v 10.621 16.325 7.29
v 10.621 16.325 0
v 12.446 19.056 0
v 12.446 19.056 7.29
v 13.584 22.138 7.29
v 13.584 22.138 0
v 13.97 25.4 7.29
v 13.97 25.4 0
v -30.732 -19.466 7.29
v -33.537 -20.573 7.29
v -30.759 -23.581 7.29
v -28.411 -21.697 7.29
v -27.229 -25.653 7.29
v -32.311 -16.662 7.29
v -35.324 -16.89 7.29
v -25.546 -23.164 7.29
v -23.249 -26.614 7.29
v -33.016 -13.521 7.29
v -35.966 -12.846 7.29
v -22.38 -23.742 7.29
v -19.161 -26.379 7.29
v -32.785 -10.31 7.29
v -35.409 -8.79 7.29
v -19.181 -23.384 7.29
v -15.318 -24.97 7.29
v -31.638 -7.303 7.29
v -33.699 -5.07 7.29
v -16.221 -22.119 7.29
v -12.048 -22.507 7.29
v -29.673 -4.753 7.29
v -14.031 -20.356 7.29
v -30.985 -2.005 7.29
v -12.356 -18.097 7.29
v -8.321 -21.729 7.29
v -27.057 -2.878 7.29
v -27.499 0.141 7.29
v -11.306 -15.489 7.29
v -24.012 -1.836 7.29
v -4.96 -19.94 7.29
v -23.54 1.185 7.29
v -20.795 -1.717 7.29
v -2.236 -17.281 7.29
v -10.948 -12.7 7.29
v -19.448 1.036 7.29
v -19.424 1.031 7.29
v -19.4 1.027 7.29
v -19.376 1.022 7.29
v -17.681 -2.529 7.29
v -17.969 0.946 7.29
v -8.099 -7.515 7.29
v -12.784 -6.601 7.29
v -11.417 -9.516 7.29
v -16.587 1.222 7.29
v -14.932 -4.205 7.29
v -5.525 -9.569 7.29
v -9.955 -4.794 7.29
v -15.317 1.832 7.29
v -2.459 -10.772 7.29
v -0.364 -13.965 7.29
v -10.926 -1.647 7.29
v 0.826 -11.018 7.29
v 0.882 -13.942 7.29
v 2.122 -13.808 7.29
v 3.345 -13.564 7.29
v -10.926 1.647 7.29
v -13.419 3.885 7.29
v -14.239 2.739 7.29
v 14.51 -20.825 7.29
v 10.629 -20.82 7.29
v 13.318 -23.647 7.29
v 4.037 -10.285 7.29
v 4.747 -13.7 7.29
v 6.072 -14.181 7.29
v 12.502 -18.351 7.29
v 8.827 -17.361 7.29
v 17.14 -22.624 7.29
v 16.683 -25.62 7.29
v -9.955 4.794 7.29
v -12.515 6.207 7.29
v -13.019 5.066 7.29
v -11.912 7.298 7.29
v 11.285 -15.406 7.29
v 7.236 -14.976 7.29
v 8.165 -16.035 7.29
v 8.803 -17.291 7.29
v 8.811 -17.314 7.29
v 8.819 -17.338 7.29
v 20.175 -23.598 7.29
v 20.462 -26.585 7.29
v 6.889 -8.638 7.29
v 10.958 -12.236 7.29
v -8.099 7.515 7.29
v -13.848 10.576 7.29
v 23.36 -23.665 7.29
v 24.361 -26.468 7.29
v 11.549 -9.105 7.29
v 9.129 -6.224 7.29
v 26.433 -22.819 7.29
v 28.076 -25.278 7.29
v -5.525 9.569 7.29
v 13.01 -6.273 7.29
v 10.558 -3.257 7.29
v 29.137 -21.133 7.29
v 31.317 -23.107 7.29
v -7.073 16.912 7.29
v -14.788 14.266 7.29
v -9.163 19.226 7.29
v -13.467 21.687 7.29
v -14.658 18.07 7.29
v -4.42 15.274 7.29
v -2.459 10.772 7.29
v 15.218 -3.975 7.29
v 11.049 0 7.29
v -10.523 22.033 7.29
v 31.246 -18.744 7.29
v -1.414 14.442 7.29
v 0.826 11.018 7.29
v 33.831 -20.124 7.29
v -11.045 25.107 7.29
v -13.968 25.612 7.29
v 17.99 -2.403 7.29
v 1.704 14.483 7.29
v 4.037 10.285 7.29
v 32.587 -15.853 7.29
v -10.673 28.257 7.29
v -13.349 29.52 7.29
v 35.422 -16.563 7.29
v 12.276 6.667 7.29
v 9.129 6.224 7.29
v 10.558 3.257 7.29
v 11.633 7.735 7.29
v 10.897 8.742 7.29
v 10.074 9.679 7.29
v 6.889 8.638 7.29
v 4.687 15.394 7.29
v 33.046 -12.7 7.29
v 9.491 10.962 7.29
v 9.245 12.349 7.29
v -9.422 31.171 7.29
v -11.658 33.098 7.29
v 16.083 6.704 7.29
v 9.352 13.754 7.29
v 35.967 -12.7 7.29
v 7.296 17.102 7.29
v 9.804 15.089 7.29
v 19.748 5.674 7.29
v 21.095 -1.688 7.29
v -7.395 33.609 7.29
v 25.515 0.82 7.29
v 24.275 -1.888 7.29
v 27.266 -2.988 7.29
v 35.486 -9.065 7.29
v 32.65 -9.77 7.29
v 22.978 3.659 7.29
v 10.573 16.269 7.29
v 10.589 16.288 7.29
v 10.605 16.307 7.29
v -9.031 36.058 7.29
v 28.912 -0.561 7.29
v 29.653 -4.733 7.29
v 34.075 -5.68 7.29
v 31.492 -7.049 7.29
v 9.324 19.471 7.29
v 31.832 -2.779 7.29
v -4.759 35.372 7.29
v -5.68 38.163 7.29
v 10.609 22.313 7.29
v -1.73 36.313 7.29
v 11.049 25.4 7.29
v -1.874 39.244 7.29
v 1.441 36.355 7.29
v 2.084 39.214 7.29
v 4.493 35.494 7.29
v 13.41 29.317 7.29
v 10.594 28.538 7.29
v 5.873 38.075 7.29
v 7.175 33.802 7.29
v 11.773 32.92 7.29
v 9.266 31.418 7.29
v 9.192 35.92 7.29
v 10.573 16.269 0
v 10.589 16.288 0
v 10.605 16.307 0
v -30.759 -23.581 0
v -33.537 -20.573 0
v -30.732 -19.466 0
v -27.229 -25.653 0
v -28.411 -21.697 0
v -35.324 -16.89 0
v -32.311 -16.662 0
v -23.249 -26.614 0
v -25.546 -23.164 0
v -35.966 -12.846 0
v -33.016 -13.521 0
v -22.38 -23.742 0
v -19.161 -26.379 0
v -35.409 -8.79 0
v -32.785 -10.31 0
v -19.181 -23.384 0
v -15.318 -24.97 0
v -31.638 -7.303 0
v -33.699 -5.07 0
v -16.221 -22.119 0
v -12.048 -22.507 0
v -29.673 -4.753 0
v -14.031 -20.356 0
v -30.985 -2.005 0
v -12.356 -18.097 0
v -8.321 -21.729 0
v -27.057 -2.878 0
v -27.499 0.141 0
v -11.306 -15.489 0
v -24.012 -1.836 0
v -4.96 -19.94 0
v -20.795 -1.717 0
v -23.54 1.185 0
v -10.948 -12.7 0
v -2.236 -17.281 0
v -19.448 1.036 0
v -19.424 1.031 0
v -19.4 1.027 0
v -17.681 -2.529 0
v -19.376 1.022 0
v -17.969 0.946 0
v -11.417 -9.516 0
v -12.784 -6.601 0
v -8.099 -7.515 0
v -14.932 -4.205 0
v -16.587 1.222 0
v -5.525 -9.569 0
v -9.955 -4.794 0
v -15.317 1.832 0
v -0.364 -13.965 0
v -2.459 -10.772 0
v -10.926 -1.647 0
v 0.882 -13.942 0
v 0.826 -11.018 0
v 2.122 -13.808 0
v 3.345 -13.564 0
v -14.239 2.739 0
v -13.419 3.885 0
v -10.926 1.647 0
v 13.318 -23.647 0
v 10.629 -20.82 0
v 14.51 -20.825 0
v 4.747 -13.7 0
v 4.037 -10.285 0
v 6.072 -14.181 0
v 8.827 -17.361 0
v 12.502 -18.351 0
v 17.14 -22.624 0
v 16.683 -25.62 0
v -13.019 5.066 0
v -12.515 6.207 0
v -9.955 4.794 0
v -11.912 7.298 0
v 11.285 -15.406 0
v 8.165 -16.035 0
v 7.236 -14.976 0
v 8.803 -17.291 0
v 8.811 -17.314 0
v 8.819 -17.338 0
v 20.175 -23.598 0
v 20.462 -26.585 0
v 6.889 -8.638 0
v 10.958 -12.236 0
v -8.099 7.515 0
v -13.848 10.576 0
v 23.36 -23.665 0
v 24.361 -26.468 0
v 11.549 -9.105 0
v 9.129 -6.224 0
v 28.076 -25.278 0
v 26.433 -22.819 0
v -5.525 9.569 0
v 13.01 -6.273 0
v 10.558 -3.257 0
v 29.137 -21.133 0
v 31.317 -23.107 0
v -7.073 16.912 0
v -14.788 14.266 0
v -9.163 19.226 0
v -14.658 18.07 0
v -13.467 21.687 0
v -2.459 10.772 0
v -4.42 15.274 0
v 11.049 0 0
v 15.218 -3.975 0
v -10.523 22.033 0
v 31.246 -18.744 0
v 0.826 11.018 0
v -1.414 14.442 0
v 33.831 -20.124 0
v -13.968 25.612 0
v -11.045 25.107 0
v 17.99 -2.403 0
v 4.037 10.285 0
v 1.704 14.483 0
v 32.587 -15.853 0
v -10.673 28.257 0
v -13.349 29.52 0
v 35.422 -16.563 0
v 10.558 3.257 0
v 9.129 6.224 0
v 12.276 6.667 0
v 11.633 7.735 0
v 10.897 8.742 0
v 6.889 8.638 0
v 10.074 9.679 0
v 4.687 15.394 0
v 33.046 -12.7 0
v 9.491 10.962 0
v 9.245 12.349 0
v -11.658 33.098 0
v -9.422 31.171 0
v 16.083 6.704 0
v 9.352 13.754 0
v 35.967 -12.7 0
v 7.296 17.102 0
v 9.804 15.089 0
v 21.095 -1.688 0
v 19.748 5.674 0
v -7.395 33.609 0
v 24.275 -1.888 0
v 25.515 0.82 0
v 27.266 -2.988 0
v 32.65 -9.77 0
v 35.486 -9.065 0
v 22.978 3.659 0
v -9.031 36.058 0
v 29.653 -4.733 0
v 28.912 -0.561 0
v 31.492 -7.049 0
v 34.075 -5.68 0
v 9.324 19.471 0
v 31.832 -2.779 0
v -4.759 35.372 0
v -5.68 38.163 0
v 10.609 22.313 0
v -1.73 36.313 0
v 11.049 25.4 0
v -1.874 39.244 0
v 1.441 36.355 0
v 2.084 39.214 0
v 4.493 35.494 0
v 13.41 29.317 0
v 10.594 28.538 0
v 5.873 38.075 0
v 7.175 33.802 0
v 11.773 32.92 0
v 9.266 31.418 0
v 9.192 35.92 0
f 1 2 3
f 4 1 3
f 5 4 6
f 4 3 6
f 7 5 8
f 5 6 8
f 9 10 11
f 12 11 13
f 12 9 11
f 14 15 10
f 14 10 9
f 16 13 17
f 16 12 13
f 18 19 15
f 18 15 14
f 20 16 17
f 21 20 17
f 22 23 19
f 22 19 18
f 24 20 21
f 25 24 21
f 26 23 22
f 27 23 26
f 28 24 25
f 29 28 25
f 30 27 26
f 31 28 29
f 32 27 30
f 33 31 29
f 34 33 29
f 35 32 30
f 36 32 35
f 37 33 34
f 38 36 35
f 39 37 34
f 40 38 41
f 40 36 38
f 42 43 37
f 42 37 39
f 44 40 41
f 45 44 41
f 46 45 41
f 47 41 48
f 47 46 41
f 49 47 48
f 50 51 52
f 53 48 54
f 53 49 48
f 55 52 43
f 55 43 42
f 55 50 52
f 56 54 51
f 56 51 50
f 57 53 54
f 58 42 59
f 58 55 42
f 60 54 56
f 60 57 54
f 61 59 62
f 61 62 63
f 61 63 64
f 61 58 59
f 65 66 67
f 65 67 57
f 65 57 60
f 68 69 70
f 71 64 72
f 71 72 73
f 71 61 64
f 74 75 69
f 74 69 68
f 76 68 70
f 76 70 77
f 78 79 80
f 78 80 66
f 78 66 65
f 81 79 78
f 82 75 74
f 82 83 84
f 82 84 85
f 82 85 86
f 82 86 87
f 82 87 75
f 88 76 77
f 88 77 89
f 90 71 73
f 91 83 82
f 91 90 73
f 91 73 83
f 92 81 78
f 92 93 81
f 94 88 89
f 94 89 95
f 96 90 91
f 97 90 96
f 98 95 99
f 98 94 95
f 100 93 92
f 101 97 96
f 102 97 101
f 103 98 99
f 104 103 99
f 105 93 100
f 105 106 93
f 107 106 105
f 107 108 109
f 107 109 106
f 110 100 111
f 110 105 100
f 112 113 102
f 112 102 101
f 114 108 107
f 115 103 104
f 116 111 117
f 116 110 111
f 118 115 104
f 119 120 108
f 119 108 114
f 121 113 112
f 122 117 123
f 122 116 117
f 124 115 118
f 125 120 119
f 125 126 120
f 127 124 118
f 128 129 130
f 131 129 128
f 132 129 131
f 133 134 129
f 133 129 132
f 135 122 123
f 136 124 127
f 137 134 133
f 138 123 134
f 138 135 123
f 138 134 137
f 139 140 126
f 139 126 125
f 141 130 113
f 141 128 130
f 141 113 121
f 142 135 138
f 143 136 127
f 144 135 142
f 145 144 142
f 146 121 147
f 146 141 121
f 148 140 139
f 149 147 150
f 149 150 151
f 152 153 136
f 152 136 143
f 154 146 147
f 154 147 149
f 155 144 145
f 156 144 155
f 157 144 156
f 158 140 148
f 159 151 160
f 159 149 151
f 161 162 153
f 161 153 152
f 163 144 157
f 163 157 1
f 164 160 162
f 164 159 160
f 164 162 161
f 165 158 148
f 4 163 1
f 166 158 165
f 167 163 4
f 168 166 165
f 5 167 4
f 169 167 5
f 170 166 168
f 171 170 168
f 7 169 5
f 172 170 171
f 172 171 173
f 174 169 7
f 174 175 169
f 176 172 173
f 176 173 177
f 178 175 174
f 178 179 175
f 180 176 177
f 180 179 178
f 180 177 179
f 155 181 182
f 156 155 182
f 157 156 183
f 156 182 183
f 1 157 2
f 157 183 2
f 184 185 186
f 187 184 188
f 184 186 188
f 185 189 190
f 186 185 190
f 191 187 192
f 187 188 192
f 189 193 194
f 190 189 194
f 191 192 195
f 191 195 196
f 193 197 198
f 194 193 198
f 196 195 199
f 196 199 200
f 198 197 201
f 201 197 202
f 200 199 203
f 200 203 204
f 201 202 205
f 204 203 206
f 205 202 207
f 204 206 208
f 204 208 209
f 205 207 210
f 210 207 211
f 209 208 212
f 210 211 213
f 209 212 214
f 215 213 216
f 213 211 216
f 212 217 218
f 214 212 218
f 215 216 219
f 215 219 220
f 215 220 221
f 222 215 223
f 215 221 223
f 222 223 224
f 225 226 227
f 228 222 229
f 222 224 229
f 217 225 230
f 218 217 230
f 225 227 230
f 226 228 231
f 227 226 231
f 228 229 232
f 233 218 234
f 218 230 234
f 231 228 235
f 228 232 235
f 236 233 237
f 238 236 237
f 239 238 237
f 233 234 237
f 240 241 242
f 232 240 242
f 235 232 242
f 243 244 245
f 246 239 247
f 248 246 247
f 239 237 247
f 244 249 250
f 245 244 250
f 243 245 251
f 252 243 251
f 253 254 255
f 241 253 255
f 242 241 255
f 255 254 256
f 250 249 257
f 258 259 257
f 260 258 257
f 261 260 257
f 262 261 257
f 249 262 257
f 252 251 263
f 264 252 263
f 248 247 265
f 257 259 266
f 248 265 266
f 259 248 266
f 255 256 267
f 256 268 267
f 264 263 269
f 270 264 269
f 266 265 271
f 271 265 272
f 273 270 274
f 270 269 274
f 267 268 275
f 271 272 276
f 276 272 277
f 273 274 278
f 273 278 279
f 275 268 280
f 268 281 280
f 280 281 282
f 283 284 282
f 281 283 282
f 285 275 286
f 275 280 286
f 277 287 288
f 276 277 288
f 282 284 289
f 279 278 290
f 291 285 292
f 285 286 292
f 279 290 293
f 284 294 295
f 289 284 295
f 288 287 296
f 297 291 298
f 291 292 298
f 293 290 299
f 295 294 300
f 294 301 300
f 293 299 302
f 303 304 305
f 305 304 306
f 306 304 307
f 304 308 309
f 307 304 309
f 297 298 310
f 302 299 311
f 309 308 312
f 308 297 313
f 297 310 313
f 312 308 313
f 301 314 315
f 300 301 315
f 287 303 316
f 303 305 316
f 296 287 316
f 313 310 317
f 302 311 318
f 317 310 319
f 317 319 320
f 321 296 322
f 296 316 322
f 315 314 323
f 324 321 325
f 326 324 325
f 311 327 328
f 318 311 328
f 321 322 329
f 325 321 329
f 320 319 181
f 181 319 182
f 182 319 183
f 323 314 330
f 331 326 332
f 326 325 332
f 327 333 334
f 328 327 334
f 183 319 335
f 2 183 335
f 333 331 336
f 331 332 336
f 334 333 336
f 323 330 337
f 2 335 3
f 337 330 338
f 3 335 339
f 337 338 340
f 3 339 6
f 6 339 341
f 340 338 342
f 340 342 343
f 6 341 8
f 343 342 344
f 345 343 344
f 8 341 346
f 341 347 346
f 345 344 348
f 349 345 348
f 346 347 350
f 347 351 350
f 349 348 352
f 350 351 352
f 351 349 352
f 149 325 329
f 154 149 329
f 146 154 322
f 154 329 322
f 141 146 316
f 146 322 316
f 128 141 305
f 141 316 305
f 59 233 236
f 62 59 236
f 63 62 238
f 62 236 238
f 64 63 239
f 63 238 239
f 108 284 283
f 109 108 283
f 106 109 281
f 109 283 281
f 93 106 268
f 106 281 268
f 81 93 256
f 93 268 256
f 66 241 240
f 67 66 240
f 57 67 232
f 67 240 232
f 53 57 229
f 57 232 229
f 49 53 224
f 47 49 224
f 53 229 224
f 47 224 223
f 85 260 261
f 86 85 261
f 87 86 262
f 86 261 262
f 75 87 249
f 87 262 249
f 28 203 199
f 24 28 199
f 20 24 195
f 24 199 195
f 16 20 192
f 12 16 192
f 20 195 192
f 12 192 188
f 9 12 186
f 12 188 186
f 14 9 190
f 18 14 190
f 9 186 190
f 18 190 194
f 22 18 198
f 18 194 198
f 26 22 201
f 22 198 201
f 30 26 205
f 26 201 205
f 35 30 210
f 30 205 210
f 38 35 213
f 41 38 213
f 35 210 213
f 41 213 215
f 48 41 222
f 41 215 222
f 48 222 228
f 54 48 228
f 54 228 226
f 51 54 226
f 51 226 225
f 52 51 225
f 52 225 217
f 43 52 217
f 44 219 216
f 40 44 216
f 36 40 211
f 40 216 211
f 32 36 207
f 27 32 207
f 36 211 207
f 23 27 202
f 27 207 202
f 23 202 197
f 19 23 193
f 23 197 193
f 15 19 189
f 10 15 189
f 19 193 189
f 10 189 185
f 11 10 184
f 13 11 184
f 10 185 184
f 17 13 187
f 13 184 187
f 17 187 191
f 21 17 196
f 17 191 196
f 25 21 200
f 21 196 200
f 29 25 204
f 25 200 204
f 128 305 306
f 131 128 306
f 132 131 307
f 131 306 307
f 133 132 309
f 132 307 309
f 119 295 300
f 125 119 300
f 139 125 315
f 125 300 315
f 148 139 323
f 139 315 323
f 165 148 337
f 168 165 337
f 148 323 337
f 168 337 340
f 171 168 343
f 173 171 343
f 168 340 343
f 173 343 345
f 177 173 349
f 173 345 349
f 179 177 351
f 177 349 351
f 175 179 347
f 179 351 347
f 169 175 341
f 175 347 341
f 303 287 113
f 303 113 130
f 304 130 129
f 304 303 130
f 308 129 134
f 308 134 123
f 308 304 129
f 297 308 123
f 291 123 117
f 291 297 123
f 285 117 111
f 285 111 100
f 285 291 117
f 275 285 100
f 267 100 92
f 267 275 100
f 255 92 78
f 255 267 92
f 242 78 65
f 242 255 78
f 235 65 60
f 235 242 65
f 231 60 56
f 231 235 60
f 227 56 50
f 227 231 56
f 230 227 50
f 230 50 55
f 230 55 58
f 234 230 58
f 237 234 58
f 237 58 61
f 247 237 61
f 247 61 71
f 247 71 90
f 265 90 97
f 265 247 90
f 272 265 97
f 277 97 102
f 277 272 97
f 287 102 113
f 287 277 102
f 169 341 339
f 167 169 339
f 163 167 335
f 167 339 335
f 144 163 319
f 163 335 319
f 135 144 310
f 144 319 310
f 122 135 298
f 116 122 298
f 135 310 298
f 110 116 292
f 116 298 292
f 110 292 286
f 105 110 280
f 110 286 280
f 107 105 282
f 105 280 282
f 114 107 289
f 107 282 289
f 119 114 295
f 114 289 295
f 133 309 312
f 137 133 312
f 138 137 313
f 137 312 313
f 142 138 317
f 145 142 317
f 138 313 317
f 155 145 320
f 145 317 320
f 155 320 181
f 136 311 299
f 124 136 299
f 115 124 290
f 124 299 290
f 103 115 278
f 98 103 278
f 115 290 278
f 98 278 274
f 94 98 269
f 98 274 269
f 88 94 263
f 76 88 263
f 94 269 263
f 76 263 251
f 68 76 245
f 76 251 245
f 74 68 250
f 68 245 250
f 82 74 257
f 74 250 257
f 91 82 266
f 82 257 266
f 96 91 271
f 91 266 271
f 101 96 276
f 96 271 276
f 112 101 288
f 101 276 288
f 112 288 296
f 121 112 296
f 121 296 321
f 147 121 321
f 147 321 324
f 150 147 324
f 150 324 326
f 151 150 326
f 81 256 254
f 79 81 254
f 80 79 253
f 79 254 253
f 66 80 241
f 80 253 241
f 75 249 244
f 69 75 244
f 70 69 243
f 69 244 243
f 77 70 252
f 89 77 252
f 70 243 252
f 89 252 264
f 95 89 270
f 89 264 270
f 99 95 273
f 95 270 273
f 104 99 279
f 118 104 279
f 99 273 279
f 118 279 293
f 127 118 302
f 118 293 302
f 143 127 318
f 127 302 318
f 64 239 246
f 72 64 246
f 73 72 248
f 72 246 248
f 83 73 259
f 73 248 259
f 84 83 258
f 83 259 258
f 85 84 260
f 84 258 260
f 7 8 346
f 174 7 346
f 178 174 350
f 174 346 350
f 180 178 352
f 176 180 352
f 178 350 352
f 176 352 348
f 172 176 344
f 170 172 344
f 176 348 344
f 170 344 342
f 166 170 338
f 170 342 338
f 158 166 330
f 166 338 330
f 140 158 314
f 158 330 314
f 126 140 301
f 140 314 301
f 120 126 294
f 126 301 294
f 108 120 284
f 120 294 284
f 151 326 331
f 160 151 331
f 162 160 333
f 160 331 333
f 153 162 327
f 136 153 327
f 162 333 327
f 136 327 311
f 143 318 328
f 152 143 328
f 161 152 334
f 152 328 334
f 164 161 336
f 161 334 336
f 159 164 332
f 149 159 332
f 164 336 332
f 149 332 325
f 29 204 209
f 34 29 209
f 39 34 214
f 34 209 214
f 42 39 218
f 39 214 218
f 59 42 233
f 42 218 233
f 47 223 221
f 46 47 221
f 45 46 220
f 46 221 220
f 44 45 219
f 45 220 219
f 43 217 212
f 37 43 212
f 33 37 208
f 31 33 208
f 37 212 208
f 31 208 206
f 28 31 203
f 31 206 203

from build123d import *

# Parameters (mm, degrees)
F0_R     = 11.049
F1_DEPTH = 7.2898


# Not quite as in the source:
# - a feature names something its author has since deleted; it is built from what else it names


with BuildPart() as f1:
    # F0 (on Top) → F1 (new body)
    with BuildSketch(Plane.XY):
        with BuildLine():
            ThreePointArc((13.9084581944, -1.3098437524), (13.9546060671, -0.655644349), (13.97, 0))
            ThreePointArc((13.97, 0), (13.5399902372, 3.4394133768), (12.2764331601, 6.6670899848))
            ThreePointArc((12.2764331601, 6.6670899848), (11.2762217496, 8.2466795168), (10.0740419848, 9.6785628111))
            ThreePointArc((10.0740419848, 9.6785628111), (8.0892761862, 11.3896668425), (5.8198711326, 12.7))
            ThreePointArc((5.8198711326, 12.7), (0, 11.43), (-5.8198711326, 12.7))
            ThreePointArc((-5.8198711326, 12.7), (-9.2682549118, 10.4527676187), (-11.9120858762, 7.2981579921))
            ThreePointArc((-11.9120858762, 7.2981579921), (-12.7799448333, 5.6421547355), (-13.4189022589, 3.8850948721))
            ThreePointArc((-13.4189022589, 3.8850948721), (-13.9083789193, 1.3106852543), (-13.9084581944, -1.3098437524))
            ThreePointArc((-13.9084581944, -1.3098437524), (-9.8986703653, -5.715), (-8.0885870618, -11.3901562476))
            ThreePointArc((-8.0885870618, -11.3901562476), (-4.4182348417, -13.2529280117), (-0.3643472839, -13.9652479769))
            ThreePointArc((-0.3643472839, -13.9652479769), (1.5037230836, -13.8888342523), (3.3448602741, -13.5636576832))
            ThreePointArc((3.3448602741, -13.5636576832), (5.8191027331, -12.7003520968), (8.0885870618, -11.3901562476))
            ThreePointArc((8.0885870618, -11.3901562476), (9.8986703653, -5.715), (13.9084581944, -1.3098437524))
        make_face()
        Circle(F0_R, mode=Mode.SUBTRACT)
        with BuildLine():
            ThreePointArc((12.2764331601, 6.6670899848), (13.5399902372, 3.4394133768), (13.97, 0))
            ThreePointArc((13.97, 0), (13.9546060671, -0.655644349), (13.9084581944, -1.3098437524))
            ThreePointArc((13.9084581944, -1.3098437524), (19.4758239296, 1.0406092668), (25.5149823418, 0.8198009845))
            ThreePointArc((25.5149823418, 0.8198009845), (19.7483617265, 5.673895919), (12.2764331601, 6.6670899848))
        make_face()
        with BuildLine():
            ThreePointArc((25.5149823418, 0.8198009845), (19.4758239296, 1.0406092668), (13.9084581944, -1.3098437524))
            ThreePointArc((13.9084581944, -1.3098437524), (12.0983748909, -6.985), (8.0885870618, -11.3901562476))
            ThreePointArc((8.0885870618, -11.3901562476), (8.1283324688, -14.3791979101), (8.8030929872, -17.2913531259))
            ThreePointArc((8.8030929872, -17.2913531259), (8.8153498636, -17.3259186272), (8.8273812481, -17.3605632616))
            ThreePointArc((8.8273812481, -17.3605632616), (24.3614367008, -26.4684622633), (35.9670452561, -12.7))
            ThreePointArc((35.9670452561, -12.7), (33.0493409698, -4.1555480306), (25.5149823418, 0.8198009845))
        make_face()
        with BuildLine():
            ThreePointArc((33.0460452561, -12.7), (12.502346623, -18.3507609104), (27.2661377773, -2.9883026713))
            ThreePointArc((27.2661377773, -2.9883026713), (31.4917438892, -7.0492390896), (33.0460452561, -12.7))
        make_face(mode=Mode.SUBTRACT)
        with BuildLine():
            ThreePointArc((8.0885870618, -11.3901562476), (12.0983748909, -6.985), (13.9084581944, -1.3098437524))
            ThreePointArc((13.9084581944, -1.3098437524), (9.8986703653, -5.715), (8.0885870618, -11.3901562476))
        make_face()
        with BuildLine():
            ThreePointArc((5.8198711326, 12.7), (8.0892761862, 11.3896668425), (10.0740419848, 9.6785628111))
            ThreePointArc((10.0740419848, 9.6785628111), (9.2542217215, 13.054963054), (10.5732045792, 16.2693787218))
            ThreePointArc((10.5732045792, 16.2693787218), (8.3885844419, 14.2289413634), (5.8198711326, 12.7))
        make_face()
        with BuildLine():
            ThreePointArc((8.8030929872, -17.2913531259), (8.1283324688, -14.3791979101), (8.0885870618, -11.3901562476))
            ThreePointArc((8.0885870618, -11.3901562476), (5.8191027331, -12.7003520968), (3.3448602741, -13.5636576832))
            ThreePointArc((3.3448602741, -13.5636576832), (6.6788187895, -14.54187263), (8.8030929872, -17.2913531259))
        make_face()
        with BuildLine():
            ThreePointArc((-5.8198711326, 12.7), (0, 11.43), (5.8198711326, 12.7))
            ThreePointArc((5.8198711326, 12.7), (0, 13.97), (-5.8198711326, 12.7))
        make_face()
        with BuildLine():
            ThreePointArc((-5.8198711326, 12.7), (0, 13.97), (5.8198711326, 12.7))
            ThreePointArc((5.8198711326, 12.7), (8.3885844419, 14.2289413634), (10.5732045792, 16.2693787218))
            ThreePointArc((10.5732045792, 16.2693787218), (10.5970107433, 16.2972762387), (10.6209981845, 16.3250180405))
            ThreePointArc((10.6209981845, 16.3250180405), (13.1060338134, 20.563391924), (13.97, 25.4))
            ThreePointArc((13.97, 25.4), (-1.87356461, 39.2437948429), (-13.4674596495, 21.6867223928))
            ThreePointArc((-13.4674596495, 21.6867223928), (-10.6391060252, 16.3462536492), (-5.8198711326, 12.7))
        make_face()
        with BuildLine():
            ThreePointArc((11.049, 25.4), (0.1463531826, 14.3519693273), (-11.0451228611, 25.1073193139))
            ThreePointArc((-11.0451228611, 25.1073193139), (-0.1463531826, 36.4480306727), (11.049, 25.4))
        make_face(mode=Mode.SUBTRACT)
        with BuildLine():
            ThreePointArc((8.8273812481, -17.3605632616), (8.8153498636, -17.3259186272), (8.8030929872, -17.2913531259))
            ThreePointArc((8.8030929872, -17.2913531259), (8.8151916949, -17.3259741342), (8.8273812481, -17.3605632616))
        make_face()
        with BuildLine():
            ThreePointArc((-11.9120858762, 7.2981579921), (-9.2682549118, 10.4527676187), (-5.8198711326, 12.7))
            ThreePointArc((-5.8198711326, 12.7), (-10.6391060252, 16.3462536492), (-13.4674596495, 21.6867223928))
            ThreePointArc((-13.4674596495, 21.6867223928), (-14.7879188675, 14.2656349788), (-11.9120858762, 7.2981579921))
        make_face()
        with BuildLine():
            ThreePointArc((-12.0475226922, -22.5065233774), (-4.960442859, -19.9395308977), (-0.3643472839, -13.9652479769))
            ThreePointArc((-0.3643472839, -13.9652479769), (-4.4182348417, -13.2529280117), (-8.0885870618, -11.3901562476))
            ThreePointArc((-8.0885870618, -11.3901562476), (-8.042439189, -12.044355651), (-8.0270452561, -12.7))
            ThreePointArc((-8.0270452561, -12.7), (-9.0711849324, -17.9993428735), (-12.0475226922, -22.5065233774))
        make_face()
        with BuildLine():
            ThreePointArc((-8.0270452561, -12.7), (-8.042439189, -12.044355651), (-8.0885870618, -11.3901562476))
            ThreePointArc((-8.0885870618, -11.3901562476), (-12.0983748909, -6.985), (-13.9084581944, -1.3098437524))
            ThreePointArc((-13.9084581944, -1.3098437524), (-16.5169169106, 0.1502565467), (-19.3762975665, 1.0219744041))
            ThreePointArc((-19.3762975665, 1.0219744041), (-19.4123606069, 1.0286423885), (-19.4483794326, 1.0355452211))
            ThreePointArc((-19.4483794326, 1.0355452211), (-35.3240264115, -16.8895671954), (-12.0475226922, -22.5065233774))
            ThreePointArc((-12.0475226922, -22.5065233774), (-9.0711849324, -17.9993428735), (-8.0270452561, -12.7))
        make_face()
        with BuildLine():
            ThreePointArc((-10.9480452561, -12.7), (-12.3559934404, -18.0972697623), (-16.2210149162, -22.1190166425))
            ThreePointArc((-16.2210149162, -22.1190166425), (-31.6380970718, -7.3027302377), (-10.9480452561, -12.7))
        make_face(mode=Mode.SUBTRACT)
        with BuildLine():
            ThreePointArc((-13.9084581944, -1.3098437524), (-12.0983748909, -6.985), (-8.0885870618, -11.3901562476))
            ThreePointArc((-8.0885870618, -11.3901562476), (-9.8986703653, -5.715), (-13.9084581944, -1.3098437524))
        make_face()
        with BuildLine():
            ThreePointArc((-13.9084581944, -1.3098437524), (-13.9083789193, 1.3106852543), (-13.4189022589, 3.8850948721))
            ThreePointArc((-13.4189022589, 3.8850948721), (-15.933040511, 1.486909576), (-19.3762975665, 1.0219744041))
            ThreePointArc((-19.3762975665, 1.0219744041), (-16.5169169106, 0.1502565467), (-13.9084581944, -1.3098437524))
        make_face()
        with BuildLine():
            ThreePointArc((-19.3762975665, 1.0219744041), (-19.412329593, 1.0288071201), (-19.4483794326, 1.0355452211))
            ThreePointArc((-19.4483794326, 1.0355452211), (-19.4123606069, 1.0286423885), (-19.3762975665, 1.0219744041))
        make_face()
    extrude(amount=F1_DEPTH)


solid = f1.part
